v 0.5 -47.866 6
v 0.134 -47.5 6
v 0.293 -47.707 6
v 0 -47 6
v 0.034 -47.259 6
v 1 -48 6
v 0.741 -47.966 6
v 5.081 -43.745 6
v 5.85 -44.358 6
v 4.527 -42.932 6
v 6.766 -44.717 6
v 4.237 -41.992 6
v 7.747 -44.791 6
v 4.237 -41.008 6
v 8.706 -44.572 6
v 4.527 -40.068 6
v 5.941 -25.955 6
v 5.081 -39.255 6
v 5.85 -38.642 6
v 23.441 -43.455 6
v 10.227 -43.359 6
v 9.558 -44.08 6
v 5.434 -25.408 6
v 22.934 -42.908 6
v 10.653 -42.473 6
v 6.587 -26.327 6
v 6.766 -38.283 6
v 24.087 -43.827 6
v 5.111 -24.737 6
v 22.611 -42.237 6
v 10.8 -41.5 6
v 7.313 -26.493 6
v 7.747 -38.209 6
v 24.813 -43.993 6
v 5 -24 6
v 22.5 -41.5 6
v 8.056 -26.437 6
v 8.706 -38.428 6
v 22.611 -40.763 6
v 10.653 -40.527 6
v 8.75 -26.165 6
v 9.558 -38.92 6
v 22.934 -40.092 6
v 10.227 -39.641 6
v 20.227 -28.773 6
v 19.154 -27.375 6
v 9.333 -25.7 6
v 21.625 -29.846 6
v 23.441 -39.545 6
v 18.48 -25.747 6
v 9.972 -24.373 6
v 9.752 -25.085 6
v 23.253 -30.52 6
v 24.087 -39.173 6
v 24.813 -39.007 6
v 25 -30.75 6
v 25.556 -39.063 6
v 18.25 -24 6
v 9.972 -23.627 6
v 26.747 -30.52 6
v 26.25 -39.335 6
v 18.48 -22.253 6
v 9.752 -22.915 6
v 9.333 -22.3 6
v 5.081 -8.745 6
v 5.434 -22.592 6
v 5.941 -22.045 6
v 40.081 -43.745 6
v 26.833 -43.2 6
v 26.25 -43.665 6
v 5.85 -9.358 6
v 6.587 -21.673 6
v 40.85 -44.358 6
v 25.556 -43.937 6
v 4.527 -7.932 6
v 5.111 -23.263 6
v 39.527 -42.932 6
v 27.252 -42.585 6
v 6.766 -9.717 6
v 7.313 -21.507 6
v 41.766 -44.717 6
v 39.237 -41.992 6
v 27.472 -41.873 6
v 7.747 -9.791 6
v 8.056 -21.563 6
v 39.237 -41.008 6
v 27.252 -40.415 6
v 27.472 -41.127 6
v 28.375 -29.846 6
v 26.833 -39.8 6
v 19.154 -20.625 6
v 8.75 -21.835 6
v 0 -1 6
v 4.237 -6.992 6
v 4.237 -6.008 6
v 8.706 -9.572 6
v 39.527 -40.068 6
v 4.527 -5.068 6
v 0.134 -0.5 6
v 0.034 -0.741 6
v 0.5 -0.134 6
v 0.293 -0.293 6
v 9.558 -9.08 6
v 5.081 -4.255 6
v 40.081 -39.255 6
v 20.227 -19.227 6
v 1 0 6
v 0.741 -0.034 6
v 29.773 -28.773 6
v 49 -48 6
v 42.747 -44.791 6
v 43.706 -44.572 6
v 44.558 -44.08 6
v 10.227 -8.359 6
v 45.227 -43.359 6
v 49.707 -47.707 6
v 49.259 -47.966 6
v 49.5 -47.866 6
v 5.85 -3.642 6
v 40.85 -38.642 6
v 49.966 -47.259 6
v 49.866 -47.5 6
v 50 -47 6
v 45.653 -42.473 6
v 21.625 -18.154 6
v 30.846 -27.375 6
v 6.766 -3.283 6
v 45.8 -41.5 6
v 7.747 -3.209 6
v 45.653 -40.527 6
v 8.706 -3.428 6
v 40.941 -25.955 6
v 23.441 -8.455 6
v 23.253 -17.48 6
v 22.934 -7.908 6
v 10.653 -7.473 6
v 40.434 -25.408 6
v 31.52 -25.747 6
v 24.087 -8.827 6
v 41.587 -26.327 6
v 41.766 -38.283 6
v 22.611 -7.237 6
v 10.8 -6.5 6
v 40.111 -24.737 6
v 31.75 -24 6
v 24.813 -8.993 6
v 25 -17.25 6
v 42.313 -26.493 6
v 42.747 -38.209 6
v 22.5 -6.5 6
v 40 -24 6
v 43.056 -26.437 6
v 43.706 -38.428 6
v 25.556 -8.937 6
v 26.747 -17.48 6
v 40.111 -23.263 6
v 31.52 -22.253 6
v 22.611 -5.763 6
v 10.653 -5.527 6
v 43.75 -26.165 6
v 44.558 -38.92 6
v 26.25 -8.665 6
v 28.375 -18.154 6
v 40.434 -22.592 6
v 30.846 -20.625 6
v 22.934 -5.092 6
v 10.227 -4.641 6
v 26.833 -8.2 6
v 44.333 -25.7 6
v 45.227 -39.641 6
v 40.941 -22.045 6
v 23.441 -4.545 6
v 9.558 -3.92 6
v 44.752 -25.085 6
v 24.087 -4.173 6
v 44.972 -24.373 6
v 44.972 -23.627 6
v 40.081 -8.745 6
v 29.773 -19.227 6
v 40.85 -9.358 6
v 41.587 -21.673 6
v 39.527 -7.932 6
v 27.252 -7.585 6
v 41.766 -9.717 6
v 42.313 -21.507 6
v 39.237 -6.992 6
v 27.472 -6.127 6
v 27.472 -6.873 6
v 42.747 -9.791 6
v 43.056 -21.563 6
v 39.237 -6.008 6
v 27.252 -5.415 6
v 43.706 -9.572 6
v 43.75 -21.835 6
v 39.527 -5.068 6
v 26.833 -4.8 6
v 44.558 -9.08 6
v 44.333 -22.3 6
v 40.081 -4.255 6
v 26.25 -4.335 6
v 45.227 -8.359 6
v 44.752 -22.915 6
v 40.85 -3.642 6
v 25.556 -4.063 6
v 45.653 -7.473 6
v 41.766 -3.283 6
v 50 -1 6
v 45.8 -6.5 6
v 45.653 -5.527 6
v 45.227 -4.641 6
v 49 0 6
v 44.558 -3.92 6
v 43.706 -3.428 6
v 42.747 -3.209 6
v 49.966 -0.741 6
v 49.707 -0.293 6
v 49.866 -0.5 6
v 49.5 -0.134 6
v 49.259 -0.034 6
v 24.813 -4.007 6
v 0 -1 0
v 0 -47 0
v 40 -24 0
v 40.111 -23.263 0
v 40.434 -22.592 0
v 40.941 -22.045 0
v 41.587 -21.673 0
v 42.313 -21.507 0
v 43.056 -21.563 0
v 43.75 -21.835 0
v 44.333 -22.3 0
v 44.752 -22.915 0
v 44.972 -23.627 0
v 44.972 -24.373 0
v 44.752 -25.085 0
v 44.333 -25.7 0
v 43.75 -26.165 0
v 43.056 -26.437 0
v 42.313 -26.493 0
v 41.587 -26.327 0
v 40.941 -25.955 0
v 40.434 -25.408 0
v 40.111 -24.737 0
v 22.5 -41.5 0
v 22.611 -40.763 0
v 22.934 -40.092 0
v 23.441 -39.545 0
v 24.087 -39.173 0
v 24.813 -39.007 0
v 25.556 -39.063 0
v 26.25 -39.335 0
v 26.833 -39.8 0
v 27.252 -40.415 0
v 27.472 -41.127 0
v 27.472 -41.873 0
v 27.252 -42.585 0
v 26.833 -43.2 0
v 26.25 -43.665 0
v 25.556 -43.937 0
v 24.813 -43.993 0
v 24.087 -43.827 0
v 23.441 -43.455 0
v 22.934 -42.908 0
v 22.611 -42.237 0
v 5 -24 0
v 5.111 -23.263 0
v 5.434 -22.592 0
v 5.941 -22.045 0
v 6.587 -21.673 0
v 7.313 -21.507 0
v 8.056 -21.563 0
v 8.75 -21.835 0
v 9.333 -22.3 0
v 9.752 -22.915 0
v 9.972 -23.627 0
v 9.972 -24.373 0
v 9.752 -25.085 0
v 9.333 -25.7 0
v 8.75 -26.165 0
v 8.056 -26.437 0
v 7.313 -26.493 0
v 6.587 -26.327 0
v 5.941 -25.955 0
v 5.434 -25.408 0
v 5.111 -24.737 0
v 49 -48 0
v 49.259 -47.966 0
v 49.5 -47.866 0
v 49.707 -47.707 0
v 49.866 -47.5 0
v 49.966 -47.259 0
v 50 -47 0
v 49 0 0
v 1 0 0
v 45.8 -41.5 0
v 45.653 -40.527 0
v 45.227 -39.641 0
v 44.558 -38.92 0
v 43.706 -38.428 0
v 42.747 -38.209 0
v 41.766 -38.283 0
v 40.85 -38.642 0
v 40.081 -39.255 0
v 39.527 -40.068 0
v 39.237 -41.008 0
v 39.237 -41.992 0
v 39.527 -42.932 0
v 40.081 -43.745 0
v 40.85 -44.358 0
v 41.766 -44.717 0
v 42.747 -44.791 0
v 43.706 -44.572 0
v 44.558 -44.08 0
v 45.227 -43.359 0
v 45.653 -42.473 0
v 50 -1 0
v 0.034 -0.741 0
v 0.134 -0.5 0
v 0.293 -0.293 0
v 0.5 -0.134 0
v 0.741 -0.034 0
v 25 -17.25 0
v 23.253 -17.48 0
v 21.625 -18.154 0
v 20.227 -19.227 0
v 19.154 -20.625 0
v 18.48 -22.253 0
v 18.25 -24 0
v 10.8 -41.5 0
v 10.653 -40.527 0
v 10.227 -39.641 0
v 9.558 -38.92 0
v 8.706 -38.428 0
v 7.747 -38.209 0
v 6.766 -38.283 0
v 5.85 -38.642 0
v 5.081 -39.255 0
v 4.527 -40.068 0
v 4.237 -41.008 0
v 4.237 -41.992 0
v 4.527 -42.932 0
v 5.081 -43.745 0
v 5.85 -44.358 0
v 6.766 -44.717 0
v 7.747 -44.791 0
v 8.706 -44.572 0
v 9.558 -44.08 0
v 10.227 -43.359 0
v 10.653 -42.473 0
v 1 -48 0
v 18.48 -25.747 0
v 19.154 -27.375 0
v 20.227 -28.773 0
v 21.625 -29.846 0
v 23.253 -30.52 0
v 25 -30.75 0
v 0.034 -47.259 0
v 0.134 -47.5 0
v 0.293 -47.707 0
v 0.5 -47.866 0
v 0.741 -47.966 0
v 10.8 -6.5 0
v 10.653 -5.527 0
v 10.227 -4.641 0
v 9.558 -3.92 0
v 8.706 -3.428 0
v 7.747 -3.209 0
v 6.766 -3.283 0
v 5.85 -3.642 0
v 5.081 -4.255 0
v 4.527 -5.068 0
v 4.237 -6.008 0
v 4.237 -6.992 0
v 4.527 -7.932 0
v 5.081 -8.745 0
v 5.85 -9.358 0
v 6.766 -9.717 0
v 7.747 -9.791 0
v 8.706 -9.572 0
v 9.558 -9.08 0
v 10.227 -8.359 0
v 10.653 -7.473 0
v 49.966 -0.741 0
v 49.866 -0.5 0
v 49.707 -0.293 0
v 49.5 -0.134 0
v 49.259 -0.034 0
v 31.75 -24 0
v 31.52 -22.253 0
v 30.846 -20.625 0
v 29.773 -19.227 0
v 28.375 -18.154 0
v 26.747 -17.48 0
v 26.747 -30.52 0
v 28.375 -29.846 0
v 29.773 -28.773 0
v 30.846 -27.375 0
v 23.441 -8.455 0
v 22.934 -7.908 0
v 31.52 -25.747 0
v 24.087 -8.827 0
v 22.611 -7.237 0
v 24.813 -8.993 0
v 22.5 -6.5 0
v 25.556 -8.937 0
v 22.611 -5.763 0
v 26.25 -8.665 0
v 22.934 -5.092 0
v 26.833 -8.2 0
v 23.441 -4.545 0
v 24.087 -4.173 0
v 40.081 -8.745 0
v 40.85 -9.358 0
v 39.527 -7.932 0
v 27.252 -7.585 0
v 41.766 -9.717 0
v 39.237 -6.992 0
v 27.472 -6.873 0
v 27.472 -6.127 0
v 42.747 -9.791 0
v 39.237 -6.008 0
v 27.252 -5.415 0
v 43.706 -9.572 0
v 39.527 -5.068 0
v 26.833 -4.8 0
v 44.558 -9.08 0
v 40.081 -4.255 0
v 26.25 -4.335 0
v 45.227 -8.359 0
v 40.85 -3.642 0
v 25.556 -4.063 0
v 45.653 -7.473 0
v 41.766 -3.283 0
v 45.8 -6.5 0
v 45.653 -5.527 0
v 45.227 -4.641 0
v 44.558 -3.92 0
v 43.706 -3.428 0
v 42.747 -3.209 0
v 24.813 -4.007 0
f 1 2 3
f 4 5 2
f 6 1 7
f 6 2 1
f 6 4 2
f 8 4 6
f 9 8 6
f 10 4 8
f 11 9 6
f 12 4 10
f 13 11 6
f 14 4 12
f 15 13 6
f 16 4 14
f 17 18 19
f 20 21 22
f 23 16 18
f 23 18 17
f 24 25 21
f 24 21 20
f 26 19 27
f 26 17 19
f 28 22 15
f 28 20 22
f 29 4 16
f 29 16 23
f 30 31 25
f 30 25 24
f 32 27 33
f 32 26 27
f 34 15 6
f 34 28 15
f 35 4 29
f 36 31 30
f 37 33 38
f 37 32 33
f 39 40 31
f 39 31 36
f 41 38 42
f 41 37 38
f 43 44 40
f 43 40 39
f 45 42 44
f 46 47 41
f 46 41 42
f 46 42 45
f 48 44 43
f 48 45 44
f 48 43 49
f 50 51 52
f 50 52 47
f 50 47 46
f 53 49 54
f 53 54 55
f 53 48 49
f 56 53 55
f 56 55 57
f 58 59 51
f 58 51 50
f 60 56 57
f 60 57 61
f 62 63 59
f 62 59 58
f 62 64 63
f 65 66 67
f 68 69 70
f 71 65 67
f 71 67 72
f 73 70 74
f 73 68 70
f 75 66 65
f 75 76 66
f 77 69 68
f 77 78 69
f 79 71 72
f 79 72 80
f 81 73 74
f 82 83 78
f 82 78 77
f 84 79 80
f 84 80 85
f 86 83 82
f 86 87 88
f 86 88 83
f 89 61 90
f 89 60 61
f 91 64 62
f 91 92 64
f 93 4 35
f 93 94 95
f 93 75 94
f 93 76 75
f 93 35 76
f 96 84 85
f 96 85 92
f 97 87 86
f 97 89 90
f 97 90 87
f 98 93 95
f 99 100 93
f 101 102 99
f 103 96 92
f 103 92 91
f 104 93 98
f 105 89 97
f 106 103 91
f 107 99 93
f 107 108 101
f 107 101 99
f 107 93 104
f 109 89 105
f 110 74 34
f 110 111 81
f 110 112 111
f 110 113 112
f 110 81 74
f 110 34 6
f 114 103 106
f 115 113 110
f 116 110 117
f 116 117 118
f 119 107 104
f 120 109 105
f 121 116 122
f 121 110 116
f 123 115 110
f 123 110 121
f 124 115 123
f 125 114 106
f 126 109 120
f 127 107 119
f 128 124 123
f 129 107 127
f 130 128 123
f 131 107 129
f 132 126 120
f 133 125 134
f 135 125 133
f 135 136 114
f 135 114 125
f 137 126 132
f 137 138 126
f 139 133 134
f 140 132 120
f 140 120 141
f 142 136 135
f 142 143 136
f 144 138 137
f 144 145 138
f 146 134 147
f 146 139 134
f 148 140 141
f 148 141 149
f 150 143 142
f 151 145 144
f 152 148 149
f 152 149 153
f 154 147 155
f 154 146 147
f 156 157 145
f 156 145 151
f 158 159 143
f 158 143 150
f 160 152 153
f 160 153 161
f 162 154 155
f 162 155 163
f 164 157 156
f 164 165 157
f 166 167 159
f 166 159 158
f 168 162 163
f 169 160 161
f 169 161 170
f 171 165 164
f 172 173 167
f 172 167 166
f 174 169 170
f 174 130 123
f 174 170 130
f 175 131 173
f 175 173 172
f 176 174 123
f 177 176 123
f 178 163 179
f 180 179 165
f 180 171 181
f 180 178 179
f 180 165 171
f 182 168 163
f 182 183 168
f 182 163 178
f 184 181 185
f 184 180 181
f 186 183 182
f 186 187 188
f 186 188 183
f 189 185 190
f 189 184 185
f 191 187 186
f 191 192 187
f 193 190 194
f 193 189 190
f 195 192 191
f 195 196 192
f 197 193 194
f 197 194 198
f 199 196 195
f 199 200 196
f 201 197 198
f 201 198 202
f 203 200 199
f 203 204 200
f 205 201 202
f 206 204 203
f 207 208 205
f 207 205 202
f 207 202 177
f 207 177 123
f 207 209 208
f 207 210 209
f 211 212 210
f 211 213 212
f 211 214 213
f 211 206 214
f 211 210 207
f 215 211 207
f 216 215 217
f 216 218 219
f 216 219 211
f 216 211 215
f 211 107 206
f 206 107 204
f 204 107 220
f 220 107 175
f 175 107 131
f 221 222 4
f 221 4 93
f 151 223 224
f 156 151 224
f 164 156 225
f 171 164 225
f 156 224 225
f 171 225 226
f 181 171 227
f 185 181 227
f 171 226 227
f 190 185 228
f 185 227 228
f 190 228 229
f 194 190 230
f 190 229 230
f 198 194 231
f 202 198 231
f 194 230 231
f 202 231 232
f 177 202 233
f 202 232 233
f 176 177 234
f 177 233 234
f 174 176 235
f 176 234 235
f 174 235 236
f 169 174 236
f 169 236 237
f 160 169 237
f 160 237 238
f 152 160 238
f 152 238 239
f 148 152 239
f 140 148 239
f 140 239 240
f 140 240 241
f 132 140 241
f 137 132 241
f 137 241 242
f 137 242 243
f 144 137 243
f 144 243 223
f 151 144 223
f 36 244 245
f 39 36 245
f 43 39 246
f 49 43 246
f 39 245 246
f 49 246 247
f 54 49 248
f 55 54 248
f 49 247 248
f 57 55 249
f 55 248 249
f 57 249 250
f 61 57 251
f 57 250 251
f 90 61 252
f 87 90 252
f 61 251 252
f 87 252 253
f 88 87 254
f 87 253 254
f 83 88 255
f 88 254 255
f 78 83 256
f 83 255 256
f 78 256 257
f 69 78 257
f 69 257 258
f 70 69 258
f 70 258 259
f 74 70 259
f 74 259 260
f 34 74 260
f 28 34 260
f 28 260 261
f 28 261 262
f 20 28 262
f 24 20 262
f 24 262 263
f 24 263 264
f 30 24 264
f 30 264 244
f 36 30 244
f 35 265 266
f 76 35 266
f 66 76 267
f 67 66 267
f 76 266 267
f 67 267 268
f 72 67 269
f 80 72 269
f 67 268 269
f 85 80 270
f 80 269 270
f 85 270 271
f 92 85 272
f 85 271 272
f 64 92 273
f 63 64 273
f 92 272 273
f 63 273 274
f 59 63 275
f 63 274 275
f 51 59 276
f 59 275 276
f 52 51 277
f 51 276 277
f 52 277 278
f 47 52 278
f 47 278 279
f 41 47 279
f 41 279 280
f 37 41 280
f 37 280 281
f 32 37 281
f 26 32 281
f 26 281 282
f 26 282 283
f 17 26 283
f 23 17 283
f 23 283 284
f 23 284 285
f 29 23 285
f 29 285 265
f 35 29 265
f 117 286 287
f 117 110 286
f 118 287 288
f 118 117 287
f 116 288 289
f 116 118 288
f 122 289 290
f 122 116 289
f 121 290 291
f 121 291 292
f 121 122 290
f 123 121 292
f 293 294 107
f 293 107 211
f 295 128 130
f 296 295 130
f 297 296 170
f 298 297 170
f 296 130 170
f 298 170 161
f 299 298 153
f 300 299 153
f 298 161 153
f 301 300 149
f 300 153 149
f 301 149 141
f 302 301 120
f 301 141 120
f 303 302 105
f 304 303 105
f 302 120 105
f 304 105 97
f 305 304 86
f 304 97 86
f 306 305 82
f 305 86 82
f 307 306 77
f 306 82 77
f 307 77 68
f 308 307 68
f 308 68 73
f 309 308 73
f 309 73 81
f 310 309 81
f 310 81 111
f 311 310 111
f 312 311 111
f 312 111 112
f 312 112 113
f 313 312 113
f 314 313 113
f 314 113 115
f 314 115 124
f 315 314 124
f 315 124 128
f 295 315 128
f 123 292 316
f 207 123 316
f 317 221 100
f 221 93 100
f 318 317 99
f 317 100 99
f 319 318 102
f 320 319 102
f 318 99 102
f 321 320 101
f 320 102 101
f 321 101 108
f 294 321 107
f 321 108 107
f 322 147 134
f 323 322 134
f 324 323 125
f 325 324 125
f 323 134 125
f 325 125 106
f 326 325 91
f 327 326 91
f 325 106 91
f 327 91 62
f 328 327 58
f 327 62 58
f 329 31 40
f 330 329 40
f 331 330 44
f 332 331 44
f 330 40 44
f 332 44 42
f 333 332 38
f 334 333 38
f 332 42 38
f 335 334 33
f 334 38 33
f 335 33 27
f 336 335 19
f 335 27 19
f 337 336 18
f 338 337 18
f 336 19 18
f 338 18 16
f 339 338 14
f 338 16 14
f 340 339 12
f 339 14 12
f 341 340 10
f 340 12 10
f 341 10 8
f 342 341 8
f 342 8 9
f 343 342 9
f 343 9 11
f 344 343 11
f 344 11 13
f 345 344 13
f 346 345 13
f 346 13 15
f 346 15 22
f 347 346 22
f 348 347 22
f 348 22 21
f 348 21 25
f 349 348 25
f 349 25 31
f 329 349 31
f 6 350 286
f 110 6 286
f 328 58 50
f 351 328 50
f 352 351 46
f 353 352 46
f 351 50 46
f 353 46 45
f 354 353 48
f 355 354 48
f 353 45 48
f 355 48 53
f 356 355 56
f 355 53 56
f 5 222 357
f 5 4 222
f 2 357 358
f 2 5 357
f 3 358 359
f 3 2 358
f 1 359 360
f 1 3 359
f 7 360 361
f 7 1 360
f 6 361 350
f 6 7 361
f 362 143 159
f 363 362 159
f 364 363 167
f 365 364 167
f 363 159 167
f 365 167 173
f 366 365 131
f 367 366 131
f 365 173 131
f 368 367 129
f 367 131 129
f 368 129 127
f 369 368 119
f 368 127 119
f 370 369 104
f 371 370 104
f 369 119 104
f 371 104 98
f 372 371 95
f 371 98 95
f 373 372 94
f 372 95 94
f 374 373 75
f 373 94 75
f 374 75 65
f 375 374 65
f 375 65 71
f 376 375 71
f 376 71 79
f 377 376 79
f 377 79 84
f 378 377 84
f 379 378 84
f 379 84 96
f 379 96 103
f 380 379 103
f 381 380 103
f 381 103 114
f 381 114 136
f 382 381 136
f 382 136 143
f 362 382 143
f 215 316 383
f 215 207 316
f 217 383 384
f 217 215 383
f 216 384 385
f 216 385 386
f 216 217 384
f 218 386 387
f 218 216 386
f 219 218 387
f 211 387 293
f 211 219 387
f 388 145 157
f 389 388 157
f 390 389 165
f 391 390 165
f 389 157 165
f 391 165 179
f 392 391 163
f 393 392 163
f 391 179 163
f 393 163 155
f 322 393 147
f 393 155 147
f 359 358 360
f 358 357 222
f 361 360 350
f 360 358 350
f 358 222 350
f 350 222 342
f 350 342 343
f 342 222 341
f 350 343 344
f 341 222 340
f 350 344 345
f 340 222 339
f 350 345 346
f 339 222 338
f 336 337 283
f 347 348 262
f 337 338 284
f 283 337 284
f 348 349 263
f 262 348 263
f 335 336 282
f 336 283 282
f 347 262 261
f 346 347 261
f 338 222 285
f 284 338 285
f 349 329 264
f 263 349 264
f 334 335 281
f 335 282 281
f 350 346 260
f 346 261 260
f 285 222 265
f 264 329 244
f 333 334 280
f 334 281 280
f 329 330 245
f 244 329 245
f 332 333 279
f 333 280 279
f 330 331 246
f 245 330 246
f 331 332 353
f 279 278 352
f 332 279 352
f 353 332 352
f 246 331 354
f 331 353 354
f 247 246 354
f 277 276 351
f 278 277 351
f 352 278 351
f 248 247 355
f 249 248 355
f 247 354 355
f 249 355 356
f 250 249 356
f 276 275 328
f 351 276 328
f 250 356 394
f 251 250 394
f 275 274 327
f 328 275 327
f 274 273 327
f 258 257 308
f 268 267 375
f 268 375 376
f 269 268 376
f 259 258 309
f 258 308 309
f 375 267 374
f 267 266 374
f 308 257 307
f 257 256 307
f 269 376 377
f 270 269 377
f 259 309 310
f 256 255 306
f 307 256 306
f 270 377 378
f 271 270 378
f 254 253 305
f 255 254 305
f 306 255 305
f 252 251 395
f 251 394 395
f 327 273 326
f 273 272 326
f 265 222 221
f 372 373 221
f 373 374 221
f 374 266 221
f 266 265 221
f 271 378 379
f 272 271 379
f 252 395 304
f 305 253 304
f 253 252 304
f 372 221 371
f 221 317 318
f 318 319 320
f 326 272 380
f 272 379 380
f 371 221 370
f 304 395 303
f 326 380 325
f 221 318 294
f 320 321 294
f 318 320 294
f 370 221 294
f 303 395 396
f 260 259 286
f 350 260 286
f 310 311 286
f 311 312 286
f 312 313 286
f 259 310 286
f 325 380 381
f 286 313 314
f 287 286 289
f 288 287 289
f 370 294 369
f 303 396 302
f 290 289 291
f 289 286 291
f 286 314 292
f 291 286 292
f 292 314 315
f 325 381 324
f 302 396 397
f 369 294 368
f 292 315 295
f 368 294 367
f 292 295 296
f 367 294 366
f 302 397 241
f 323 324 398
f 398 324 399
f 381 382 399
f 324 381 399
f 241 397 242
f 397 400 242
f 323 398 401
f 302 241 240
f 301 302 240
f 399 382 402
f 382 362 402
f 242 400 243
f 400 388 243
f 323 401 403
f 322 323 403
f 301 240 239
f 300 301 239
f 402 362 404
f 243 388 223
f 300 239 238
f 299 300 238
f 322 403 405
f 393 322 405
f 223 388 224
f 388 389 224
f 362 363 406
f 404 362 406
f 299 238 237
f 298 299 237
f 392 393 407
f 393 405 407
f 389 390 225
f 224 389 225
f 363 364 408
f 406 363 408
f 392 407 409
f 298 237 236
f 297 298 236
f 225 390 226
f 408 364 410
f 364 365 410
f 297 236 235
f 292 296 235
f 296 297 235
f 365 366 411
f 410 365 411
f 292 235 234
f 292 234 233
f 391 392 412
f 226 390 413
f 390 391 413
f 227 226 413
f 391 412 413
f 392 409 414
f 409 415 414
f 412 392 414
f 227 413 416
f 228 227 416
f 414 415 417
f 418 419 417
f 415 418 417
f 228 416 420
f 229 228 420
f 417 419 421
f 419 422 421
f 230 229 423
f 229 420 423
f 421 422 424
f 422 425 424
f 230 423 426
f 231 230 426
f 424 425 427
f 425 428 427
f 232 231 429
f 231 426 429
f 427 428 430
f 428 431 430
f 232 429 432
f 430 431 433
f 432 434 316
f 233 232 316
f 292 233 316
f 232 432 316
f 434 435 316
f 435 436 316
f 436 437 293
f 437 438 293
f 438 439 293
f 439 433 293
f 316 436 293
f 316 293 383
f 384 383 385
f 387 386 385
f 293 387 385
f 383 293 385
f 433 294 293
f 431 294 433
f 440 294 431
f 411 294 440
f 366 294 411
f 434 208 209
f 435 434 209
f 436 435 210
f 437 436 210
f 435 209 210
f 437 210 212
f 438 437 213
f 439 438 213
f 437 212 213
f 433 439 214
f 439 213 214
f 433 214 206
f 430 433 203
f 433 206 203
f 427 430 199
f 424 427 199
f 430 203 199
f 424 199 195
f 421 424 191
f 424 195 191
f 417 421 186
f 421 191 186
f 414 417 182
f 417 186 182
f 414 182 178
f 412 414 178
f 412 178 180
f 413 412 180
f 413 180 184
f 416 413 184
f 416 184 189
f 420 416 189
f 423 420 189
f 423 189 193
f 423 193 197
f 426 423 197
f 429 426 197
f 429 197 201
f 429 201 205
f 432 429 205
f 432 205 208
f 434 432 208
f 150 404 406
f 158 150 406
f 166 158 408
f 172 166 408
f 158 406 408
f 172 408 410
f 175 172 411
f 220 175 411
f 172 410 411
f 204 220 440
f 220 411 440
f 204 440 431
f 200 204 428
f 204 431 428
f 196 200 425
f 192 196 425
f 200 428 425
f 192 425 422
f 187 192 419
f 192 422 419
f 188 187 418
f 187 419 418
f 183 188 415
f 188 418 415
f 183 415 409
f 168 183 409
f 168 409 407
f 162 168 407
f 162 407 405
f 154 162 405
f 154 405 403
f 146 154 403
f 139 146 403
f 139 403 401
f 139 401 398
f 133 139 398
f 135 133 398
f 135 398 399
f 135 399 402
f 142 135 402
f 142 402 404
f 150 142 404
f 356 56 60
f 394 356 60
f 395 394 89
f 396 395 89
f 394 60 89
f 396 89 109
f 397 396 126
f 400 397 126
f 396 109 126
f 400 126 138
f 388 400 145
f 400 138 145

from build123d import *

# Parameters (mm, degrees)
SKETCH_1_W          = 50
SKETCH_1_H          = 48
EXTRUDE_1_DEPTH     = 6
FILLET_1_R          = 1
SKETCH_2_R          = 3.3
CUT_EXTRUDE_1_DEPTH = 70.570108524
HOLE_WIZARD_M6_2_D  = 5


with BuildPart() as part:
    # 草图1 → 凸台-拉伸1 (new body)
    with BuildSketch(Plane.XY):
        with Locations((25, -24)):
            Rectangle(SKETCH_1_W, SKETCH_1_H)
    extrude(amount=EXTRUDE_1_DEPTH)

    # 圆角1
    fillet_1_edges = [part.edges().sort_by_distance(p)[0] for p in [
        (0, 0, 3),
        (50, 0, 3),
        (50, -48, 3),
        (0, -48, 3),
    ]]
    fillet(fillet_1_edges, radius=FILLET_1_R)

    # 草图2 → 切除-拉伸1 (cut, through all)
    with BuildSketch(Plane.XY.offset(6)):
        with Locations((7.5, -6.5)):
            Circle(SKETCH_2_R)
        with Locations((42.5, -6.5)):
            Circle(SKETCH_2_R)
        with Locations((42.5, -41.5)):
            Circle(SKETCH_2_R)
        with Locations((7.5, -41.5)):
            Circle(SKETCH_2_R)
        with BuildLine():
            Line((25, -24), (31.75, -24))
            ThreePointArc((31.75, -24), (29.772970773, -19.227029227), (25, -17.25))
            Line((25, -17.25), (25, -24))
        make_face()
        with BuildLine():
            Line((18.25, -24), (25, -24))
            Line((25, -24), (25, -17.25))
            ThreePointArc((25, -17.25), (20.227029227, -19.227029227), (18.25, -24))
        make_face()
        with BuildLine():
            ThreePointArc((25, -30.75), (29.772970773, -28.772970773), (31.75, -24))
            Line((31.75, -24), (25, -24))
            Line((25, -24), (25, -30.75))
        make_face()
        with BuildLine():
            Line((25, -30.75), (25, -24))
            Line((25, -24), (18.25, -24))
            ThreePointArc((18.25, -24), (20.227029227, -28.772970773), (25, -30.75))
        make_face()
    extrude(amount=-CUT_EXTRUDE_1_DEPTH, mode=Mode.SUBTRACT)

    # M6 螺纹孔2 (through all)
    with Locations(Plane.XY.offset(6)):
        with Locations((25, -6.5), (42.5, -24), (25, -41.5), (7.5, -24)):
            Hole(HOLE_WIZARD_M6_2_D / 2)


solid = part.part
